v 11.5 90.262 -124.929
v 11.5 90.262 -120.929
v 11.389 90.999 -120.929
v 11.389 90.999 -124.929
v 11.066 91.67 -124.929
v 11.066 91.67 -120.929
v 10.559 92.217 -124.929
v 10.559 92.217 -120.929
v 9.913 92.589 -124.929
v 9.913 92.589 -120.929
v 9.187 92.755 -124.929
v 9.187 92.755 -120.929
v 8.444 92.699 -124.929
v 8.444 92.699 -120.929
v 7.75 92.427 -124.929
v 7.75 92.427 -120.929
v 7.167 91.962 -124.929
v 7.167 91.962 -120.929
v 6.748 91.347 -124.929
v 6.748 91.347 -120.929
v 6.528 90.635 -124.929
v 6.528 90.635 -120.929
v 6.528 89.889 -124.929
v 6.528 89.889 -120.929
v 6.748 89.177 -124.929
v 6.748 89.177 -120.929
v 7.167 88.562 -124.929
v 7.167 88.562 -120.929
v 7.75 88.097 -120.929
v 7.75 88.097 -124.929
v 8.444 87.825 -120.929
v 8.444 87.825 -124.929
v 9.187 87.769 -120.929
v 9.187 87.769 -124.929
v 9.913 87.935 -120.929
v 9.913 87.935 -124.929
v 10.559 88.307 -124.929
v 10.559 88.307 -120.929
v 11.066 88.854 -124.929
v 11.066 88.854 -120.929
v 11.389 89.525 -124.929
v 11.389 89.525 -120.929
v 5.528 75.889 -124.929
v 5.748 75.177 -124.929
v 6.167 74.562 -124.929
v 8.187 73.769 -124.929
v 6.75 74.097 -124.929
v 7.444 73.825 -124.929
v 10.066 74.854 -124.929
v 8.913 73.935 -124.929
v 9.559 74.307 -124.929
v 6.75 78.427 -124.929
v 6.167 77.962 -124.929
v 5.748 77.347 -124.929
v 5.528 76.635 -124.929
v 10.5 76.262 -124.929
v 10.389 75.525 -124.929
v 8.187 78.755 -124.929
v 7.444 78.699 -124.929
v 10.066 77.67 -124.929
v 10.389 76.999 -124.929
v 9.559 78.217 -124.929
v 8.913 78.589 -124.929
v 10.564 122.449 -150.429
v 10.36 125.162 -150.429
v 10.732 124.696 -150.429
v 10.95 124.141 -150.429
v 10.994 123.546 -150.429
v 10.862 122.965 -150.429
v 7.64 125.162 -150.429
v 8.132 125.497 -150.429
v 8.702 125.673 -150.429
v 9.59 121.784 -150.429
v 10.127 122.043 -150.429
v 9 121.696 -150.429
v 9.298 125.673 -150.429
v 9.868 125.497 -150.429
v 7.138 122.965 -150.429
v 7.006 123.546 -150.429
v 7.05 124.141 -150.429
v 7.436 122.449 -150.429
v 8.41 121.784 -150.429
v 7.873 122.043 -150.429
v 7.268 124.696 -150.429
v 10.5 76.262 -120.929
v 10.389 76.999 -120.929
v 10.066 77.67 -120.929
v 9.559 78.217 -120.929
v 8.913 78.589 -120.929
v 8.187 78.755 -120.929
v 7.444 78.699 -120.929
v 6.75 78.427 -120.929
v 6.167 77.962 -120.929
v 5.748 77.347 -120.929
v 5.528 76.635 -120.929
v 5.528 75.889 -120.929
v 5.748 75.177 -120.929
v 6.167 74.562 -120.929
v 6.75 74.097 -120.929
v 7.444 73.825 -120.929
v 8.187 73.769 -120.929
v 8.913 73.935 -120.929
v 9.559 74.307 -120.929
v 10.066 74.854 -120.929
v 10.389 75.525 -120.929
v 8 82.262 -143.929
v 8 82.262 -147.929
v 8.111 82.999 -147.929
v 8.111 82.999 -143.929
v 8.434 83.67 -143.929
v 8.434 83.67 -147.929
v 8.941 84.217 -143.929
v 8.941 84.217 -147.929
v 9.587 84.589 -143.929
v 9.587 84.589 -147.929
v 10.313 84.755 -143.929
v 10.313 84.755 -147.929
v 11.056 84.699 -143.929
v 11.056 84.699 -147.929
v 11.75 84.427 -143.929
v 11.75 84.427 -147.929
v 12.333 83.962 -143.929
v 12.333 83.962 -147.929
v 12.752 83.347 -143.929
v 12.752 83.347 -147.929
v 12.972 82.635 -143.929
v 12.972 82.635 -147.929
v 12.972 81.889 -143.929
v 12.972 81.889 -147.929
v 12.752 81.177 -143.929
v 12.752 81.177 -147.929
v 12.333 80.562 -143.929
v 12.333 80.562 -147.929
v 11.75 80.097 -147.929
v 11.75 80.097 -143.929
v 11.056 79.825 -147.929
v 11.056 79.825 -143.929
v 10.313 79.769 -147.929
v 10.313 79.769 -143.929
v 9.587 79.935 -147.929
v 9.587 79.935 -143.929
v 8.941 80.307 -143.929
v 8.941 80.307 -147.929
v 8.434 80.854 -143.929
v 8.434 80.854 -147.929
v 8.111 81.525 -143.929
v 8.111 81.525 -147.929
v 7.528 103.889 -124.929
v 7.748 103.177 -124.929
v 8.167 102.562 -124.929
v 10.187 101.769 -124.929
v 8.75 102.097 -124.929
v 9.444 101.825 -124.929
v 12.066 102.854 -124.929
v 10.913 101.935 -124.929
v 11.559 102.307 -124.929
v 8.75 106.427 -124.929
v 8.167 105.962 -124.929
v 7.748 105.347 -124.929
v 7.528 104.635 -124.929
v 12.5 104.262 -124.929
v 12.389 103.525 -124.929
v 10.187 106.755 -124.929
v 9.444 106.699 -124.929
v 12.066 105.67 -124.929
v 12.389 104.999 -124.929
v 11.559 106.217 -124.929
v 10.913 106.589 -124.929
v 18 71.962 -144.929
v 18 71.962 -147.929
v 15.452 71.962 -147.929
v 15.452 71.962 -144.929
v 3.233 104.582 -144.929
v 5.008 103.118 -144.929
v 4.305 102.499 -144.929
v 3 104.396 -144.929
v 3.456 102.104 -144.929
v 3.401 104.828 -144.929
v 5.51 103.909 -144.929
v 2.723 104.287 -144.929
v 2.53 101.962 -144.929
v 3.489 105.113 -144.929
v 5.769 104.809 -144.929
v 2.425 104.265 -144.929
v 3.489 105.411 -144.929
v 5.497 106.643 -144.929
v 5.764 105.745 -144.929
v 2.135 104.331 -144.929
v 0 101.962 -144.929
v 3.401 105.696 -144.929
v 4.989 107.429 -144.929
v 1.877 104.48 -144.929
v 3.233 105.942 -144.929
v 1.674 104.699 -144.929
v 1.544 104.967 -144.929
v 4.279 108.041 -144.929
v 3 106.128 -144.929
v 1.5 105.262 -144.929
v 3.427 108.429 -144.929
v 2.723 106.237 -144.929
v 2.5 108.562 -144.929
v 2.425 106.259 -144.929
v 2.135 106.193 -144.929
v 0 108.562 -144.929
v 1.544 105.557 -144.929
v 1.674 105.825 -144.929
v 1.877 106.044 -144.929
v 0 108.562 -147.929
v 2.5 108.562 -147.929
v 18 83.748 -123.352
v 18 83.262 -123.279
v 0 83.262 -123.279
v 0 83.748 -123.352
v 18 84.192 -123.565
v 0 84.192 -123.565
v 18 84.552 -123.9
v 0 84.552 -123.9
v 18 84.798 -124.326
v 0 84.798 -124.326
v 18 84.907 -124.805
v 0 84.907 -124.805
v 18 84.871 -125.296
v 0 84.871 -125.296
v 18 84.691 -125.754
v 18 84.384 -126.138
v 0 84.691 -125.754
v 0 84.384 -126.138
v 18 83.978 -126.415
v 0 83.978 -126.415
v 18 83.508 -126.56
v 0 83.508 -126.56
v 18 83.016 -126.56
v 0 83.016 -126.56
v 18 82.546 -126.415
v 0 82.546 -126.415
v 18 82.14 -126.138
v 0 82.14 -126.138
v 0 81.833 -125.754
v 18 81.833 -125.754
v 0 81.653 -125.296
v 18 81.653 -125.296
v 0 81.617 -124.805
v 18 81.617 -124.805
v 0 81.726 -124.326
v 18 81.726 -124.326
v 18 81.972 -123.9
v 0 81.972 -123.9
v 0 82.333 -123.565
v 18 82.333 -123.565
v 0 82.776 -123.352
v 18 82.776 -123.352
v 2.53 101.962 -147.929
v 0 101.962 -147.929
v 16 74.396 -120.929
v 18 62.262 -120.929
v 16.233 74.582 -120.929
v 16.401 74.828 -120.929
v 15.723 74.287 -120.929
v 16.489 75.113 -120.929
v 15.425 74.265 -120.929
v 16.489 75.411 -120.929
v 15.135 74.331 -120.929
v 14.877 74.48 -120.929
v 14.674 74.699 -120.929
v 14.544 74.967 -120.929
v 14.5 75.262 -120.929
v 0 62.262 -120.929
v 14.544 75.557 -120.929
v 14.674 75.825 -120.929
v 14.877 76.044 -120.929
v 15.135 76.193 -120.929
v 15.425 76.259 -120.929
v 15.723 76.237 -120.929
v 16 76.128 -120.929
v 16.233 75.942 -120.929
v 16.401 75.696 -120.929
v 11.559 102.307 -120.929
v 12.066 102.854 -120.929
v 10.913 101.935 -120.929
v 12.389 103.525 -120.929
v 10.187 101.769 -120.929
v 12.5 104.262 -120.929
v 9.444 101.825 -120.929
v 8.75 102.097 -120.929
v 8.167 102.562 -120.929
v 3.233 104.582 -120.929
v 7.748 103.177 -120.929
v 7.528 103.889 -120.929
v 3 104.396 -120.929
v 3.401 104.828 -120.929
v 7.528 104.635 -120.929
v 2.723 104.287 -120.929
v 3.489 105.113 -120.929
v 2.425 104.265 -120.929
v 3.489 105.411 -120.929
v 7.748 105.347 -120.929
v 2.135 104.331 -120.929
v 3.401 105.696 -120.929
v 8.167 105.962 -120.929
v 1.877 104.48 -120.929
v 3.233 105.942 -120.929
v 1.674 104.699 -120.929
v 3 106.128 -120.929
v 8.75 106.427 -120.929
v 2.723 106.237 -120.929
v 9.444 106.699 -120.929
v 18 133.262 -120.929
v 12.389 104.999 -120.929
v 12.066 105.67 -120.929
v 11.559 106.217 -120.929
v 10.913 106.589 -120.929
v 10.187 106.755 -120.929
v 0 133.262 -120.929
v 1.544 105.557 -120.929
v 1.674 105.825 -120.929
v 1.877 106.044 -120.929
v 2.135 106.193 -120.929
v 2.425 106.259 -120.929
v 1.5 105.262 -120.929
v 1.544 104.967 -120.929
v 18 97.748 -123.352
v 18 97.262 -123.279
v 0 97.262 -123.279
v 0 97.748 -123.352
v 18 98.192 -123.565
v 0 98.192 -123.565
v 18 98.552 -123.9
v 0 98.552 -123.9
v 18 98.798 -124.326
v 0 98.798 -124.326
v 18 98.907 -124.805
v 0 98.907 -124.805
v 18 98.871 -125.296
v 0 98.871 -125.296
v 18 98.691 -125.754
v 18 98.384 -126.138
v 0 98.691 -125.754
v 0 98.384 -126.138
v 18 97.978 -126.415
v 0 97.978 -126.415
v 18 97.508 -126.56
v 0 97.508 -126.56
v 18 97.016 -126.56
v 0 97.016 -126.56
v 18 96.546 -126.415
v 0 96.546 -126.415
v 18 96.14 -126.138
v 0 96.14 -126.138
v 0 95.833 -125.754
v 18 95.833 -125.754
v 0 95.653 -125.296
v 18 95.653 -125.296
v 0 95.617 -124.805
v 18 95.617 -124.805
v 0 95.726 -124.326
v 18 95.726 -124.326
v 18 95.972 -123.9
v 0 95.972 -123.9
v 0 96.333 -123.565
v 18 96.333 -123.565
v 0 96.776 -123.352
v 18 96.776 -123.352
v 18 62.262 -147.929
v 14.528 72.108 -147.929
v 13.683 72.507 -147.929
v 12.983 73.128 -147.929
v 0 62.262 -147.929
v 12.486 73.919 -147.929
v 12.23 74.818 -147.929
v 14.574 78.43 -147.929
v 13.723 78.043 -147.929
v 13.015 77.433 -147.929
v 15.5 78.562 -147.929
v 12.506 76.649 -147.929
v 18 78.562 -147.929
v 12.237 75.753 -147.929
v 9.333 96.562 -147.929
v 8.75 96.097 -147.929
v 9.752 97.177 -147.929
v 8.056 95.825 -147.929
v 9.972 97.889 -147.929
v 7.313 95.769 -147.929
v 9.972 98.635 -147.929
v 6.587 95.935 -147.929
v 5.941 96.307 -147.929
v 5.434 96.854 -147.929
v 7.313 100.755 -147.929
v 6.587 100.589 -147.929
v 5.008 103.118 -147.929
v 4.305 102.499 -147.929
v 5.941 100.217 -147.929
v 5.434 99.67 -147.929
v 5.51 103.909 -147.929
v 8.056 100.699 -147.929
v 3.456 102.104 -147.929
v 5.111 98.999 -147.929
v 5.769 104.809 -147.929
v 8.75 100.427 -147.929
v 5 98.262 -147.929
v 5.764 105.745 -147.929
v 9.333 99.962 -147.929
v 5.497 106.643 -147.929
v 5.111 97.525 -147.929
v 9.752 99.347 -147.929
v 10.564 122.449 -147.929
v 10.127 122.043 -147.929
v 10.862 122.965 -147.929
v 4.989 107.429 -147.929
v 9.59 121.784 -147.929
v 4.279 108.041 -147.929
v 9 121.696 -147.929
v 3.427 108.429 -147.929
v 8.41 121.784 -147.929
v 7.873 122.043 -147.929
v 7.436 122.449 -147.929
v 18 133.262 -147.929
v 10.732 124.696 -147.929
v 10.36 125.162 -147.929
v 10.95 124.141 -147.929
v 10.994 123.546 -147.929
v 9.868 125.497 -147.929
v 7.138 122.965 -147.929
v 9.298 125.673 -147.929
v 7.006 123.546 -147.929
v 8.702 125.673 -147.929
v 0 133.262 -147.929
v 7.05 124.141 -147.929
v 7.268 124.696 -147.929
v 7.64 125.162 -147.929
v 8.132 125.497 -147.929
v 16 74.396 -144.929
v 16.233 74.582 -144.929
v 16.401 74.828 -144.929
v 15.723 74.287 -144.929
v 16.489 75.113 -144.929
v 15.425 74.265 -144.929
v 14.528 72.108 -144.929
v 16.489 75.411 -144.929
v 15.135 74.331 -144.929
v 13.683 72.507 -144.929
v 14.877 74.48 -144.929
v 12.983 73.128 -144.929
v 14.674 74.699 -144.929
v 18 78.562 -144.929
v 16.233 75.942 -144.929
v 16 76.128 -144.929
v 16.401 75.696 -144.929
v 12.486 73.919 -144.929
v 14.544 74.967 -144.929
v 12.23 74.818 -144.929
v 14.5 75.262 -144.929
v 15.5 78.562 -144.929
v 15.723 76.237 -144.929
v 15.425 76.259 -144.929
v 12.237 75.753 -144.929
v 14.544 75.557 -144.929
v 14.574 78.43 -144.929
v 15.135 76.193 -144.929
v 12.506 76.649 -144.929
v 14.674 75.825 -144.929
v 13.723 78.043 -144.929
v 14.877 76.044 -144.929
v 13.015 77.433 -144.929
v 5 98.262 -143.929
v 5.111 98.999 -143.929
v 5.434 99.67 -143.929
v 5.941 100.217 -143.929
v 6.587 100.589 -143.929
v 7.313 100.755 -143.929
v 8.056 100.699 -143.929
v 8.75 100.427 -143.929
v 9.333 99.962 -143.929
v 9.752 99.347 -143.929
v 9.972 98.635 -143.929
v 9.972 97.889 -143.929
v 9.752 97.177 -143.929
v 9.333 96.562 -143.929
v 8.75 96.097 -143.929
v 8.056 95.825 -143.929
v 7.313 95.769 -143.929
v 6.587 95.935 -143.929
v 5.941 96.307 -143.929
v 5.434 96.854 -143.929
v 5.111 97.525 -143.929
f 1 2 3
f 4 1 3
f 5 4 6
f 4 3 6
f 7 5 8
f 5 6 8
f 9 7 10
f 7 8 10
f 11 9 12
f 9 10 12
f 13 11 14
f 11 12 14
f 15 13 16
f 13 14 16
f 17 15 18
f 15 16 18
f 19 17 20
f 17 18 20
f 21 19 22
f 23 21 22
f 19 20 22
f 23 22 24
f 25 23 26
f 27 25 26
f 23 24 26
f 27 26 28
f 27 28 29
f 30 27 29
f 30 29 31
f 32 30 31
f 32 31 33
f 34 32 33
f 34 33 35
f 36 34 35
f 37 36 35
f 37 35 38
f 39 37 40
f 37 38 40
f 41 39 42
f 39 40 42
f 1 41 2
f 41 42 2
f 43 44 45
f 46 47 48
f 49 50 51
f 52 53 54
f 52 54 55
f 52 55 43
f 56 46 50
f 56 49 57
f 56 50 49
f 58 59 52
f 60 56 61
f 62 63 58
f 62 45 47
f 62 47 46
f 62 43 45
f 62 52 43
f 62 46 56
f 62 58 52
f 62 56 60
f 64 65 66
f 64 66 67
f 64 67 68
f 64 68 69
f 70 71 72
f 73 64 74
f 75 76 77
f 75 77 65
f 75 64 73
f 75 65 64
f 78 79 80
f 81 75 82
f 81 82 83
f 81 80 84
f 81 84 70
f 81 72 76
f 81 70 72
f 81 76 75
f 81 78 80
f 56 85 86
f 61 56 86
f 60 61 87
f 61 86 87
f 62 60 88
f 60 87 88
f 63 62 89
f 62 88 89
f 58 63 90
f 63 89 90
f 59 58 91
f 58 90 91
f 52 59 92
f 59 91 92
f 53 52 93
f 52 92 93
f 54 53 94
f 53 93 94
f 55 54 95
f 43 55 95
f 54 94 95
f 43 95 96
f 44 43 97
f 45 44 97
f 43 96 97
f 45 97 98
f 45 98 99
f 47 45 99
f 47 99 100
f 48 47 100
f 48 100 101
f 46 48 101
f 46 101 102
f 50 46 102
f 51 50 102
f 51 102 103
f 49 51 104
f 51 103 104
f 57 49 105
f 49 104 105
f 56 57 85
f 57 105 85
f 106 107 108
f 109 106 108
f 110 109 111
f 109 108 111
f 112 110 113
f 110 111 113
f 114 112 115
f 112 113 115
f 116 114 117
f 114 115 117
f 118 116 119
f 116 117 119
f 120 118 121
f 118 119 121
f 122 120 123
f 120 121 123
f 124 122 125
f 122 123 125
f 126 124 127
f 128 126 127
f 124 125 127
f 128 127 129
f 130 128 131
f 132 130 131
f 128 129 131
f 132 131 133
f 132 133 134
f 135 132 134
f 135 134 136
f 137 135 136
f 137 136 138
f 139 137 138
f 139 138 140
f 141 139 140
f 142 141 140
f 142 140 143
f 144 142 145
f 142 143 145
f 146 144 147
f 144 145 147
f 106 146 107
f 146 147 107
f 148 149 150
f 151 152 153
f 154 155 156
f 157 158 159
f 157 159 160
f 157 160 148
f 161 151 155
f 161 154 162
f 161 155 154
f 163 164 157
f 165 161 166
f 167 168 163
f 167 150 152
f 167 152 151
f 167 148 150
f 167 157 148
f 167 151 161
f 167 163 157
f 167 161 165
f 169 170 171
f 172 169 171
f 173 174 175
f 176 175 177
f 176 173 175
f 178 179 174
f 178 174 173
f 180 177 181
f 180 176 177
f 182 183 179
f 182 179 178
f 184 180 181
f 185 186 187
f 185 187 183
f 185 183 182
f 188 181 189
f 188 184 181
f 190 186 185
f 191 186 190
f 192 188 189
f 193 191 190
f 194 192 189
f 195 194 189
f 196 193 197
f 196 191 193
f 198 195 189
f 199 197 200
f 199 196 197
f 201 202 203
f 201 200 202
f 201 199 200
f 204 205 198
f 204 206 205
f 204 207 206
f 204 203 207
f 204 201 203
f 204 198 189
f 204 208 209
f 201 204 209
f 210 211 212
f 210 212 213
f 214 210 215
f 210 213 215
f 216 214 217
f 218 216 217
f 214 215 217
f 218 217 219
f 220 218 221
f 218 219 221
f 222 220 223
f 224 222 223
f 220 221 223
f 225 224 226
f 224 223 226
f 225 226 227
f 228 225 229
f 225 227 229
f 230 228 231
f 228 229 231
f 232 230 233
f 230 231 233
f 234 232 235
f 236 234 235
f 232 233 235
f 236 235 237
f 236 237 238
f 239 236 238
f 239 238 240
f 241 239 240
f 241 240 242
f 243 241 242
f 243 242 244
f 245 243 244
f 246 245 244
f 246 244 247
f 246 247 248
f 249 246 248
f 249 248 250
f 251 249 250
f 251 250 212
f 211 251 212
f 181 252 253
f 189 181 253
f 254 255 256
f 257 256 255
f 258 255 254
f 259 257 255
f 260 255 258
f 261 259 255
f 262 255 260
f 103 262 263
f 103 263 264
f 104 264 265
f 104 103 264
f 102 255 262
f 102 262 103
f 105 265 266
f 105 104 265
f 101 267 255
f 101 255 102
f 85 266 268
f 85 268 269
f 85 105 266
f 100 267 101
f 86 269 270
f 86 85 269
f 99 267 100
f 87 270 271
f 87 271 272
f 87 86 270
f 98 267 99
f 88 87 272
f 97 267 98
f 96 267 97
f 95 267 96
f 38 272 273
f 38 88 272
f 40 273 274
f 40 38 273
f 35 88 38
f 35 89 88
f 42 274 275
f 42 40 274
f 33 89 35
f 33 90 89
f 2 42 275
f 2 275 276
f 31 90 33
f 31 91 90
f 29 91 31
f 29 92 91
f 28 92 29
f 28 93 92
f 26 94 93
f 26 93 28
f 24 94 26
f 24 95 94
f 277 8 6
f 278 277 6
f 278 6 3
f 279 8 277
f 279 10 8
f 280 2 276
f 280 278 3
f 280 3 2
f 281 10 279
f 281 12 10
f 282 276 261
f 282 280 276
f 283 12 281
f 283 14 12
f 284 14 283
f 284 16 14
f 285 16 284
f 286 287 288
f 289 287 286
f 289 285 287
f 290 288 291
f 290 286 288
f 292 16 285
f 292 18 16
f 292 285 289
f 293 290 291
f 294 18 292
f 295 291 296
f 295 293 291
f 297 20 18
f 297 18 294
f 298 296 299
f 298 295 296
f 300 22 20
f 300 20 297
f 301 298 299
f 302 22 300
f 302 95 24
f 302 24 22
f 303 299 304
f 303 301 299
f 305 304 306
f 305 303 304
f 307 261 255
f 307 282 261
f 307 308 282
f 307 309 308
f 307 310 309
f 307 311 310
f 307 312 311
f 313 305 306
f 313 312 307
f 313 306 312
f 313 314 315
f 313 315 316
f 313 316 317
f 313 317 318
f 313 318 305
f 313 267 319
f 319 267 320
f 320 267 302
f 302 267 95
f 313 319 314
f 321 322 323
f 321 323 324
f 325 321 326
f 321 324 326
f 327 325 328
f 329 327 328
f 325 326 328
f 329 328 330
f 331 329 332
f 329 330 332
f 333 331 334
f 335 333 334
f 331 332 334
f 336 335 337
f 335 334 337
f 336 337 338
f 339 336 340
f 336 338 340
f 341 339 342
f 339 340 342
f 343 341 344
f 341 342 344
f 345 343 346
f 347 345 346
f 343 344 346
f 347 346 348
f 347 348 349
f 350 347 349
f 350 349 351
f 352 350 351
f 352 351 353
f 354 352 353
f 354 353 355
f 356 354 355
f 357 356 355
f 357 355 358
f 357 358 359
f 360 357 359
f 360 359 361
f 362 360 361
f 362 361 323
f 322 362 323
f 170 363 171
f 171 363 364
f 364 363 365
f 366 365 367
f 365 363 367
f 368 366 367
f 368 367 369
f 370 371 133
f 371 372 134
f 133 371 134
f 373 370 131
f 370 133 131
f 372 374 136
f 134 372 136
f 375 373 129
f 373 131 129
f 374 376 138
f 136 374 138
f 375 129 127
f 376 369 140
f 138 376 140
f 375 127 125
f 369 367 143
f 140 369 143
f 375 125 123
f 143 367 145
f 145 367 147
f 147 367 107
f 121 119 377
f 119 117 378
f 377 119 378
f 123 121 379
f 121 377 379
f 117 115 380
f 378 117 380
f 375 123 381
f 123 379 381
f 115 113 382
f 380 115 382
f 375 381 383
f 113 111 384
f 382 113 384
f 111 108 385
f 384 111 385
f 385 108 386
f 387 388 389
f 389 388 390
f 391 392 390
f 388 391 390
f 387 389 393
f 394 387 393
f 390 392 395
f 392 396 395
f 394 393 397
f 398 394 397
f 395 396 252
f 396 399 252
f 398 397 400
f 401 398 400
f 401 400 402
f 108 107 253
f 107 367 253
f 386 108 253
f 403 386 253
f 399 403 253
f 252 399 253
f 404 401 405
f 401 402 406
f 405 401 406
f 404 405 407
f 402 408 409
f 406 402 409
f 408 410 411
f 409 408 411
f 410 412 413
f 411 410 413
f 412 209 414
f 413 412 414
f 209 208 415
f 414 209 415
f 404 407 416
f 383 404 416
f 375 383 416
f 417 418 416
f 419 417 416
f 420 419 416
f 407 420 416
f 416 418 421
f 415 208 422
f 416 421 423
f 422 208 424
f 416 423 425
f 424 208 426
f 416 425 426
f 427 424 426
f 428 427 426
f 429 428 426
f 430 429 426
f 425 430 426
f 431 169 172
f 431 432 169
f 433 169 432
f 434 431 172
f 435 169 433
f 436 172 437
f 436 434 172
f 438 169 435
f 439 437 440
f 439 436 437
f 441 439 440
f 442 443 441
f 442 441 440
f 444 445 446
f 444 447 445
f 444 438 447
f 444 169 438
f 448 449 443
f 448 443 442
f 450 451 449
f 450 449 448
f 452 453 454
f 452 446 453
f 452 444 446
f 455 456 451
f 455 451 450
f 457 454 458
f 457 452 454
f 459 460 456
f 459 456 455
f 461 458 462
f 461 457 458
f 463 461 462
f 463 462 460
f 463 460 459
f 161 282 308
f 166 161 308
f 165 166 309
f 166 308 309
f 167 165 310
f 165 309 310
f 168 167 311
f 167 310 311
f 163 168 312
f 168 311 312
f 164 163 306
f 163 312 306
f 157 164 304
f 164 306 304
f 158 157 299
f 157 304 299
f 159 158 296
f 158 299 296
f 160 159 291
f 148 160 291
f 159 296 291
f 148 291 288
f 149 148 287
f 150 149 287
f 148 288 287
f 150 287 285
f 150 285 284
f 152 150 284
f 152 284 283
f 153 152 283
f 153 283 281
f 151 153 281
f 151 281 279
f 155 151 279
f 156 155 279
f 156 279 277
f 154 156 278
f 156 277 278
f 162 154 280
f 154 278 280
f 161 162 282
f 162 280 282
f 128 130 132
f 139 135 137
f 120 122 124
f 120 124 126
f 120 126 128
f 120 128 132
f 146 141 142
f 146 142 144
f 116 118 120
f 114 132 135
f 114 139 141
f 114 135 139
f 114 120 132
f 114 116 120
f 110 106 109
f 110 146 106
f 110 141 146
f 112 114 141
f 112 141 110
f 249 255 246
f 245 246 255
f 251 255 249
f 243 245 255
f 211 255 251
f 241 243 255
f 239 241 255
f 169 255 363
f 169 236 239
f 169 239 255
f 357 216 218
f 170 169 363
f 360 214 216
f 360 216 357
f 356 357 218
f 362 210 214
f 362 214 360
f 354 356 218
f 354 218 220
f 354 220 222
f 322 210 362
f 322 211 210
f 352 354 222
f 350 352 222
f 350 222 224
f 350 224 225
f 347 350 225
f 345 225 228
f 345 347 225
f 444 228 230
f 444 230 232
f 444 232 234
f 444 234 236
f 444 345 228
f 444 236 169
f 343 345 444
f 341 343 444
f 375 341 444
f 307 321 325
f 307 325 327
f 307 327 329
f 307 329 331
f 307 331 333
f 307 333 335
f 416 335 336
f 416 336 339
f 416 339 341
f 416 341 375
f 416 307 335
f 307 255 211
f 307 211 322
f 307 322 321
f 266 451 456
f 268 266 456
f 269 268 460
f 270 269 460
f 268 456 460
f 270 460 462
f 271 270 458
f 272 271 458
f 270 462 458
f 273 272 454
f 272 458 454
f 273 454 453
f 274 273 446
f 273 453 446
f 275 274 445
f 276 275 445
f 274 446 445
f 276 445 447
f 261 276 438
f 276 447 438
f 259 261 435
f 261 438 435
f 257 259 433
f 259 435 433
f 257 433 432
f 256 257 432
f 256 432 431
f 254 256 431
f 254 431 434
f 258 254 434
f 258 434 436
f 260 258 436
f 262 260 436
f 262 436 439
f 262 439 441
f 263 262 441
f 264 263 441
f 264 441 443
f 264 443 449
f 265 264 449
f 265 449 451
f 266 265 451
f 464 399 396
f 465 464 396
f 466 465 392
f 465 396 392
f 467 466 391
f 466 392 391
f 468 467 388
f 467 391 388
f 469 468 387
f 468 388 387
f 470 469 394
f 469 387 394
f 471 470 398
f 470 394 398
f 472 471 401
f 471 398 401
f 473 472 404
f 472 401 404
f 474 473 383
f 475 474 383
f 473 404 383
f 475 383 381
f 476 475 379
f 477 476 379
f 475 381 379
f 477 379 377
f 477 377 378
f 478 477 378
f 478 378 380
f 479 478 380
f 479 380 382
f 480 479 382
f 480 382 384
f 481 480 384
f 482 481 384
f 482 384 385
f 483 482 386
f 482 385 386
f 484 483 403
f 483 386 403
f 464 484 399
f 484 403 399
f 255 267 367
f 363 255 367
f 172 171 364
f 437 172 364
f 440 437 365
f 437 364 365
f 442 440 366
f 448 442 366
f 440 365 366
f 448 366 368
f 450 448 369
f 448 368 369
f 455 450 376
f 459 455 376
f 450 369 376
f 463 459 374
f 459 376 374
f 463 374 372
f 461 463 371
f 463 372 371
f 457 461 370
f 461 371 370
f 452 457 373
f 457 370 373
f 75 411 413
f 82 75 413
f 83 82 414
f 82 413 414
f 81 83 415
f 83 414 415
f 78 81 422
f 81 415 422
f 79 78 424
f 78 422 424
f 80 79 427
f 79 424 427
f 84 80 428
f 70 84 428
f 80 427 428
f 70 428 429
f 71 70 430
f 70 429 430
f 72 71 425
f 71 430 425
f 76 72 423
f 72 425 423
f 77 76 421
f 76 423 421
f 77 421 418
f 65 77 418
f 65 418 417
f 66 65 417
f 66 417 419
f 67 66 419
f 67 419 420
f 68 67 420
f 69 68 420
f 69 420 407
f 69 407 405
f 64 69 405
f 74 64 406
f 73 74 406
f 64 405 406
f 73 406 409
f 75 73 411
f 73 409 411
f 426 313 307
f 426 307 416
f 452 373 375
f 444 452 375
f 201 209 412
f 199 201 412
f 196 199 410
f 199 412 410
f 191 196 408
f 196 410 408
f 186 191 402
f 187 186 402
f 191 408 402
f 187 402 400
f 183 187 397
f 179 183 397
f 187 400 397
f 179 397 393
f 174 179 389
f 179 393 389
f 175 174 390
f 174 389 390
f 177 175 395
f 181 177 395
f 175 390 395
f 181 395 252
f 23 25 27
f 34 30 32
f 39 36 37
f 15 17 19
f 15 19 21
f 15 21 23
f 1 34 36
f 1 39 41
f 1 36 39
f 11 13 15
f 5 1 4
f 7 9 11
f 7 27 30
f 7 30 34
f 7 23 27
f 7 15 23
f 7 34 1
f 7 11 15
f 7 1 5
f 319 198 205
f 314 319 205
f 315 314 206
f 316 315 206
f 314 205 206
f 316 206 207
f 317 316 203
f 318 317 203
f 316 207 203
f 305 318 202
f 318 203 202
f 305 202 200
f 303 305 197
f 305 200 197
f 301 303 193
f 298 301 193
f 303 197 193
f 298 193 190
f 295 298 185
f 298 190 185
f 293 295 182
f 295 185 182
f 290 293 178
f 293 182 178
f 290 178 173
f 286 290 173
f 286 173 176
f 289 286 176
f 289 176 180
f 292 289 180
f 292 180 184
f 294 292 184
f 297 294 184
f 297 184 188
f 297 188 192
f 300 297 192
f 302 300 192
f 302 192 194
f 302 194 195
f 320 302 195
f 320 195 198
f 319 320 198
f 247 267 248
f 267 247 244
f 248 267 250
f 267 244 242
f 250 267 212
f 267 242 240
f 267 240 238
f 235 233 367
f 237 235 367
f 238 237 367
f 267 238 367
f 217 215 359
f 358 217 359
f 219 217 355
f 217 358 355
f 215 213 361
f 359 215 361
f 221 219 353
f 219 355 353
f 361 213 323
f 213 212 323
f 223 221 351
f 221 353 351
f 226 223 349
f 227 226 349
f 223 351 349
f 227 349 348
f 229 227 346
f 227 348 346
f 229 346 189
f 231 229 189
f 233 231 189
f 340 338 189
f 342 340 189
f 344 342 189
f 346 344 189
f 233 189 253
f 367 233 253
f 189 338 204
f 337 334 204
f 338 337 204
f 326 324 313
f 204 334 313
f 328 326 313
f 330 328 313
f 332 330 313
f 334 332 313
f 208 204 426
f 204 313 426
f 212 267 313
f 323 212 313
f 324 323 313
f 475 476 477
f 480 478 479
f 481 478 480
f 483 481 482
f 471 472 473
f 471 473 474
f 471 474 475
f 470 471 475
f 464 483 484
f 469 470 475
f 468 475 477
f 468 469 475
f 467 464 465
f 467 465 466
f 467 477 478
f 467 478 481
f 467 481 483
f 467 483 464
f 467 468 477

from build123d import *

# Parameters (mm, degrees)
ESQUISSE1_W             = 27
ESQUISSE1_H             = 71
BOSS_EXTRU_1_DEPTH      = 18
ESQUISSE2_R             = 1.65
ENL_V_MAT_EXTRU_1_DEPTH = 200.914193796
ESQUISSE5_R             = 2
BOSS_EXTRU_2_DEPTH      = 2.5
ESQUISSE6_R             = 2.5
ENL_V_MAT_EXTRU_2_DEPTH = 4
ENL_V_MAT_EXTRU_3_DEPTH = 3
ESQUISSE7_3_R           = 1
ENL_V_MAT_EXTRU_4_DEPTH = 138.156023146
ESQUISSE8_R             = 2.5
ENL_V_MAT_EXTRU_5_DEPTH = 4


with BuildPart() as part:
    # Esquisse1 → Boss.-Extru.1 (new body)
    with BuildSketch(Plane(origin=(0, 0, 0), x_dir=(0, 0, -1), z_dir=(1, 0, 0))):
        with Locations((134.428733504, 97.762052682)):
            Rectangle(ESQUISSE1_W, ESQUISSE1_H)
    extrude(amount=BOSS_EXTRU_1_DEPTH)

    # Esquisse2 → Enlèv. mat.-Extru.1 (cut, through all)
    with BuildSketch(Plane.ZY):
        with Locations((-124.928733504, 97.262052682)):
            Circle(ESQUISSE2_R)
        with Locations((-124.928733504, 83.262052682)):
            Circle(ESQUISSE2_R)
    extrude(amount=-ENL_V_MAT_EXTRU_1_DEPTH, mode=Mode.SUBTRACT)

    # Esquisse5 → Boss.-Extru.2 (add)
    with BuildSketch(Plane(origin=(0, 0, -147.928733504), x_dir=(-1, 0, 0), z_dir=(0, 0, -1))):
        with Locations((-9, 123.695505567)):
            Circle(ESQUISSE5_R)
    extrude(amount=BOSS_EXTRU_2_DEPTH)

    # Esquisse6 → Enlèv. mat.-Extru.2 (cut)
    with BuildSketch(Plane(origin=(0, 0, -147.928733504), x_dir=(-1, 0, 0), z_dir=(0, 0, -1))):
        with Locations((-10.5, 82.262052682)):
            Circle(ESQUISSE6_R)
        with Locations((-7.5, 98.262052682)):
            Circle(ESQUISSE6_R)
    extrude(amount=-ENL_V_MAT_EXTRU_2_DEPTH, mode=Mode.SUBTRACT)

    # Esquisse7 → Enlèv. mat.-Extru.3 (cut)
    with BuildSketch(Plane(origin=(0, 0, -147.928733504), x_dir=(-1, 0, 0), z_dir=(0, 0, -1))):
        with BuildLine():
            Line((0, 108.562052682), (-2.5, 108.562052682))
            ThreePointArc((-2.5, 108.562052682), (-5.79996536, 105.277172969), (-2.530240256, 101.962191242))
            Line((-2.530240256, 101.962191242), (0, 101.962191242))
            Line((0, 101.962191242), (0, 108.562052682))
        make_face()
        with BuildLine():
            ThreePointArc((-15.451765432, 71.962405212), (-12.200088134, 75.286170611), (-15.5, 78.562052682))
            Line((-15.5, 78.562052682), (-18, 78.562052682))
            Line((-18, 78.562052682), (-18, 71.962405212))
            Line((-18, 71.962405212), (-15.451765432, 71.962405212))
        make_face()
    extrude(amount=-ENL_V_MAT_EXTRU_3_DEPTH, mode=Mode.SUBTRACT)

    # Esquisse7<3> → Enlèv. mat.-Extru.4 (cut, through all)
    with BuildSketch(Plane(origin=(0, 0, -147.928733504), x_dir=(-1, 0, 0), z_dir=(0, 0, -1))):
        with Locations((-2.5, 105.262052682)):
            Circle(ESQUISSE7_3_R)
        with Locations((-15.5, 75.262052682)):
            Circle(ESQUISSE7_3_R)
    extrude(amount=-ENL_V_MAT_EXTRU_4_DEPTH, mode=Mode.SUBTRACT)

    # Esquisse8 → Enlèv. mat.-Extru.5 (cut)
    with BuildSketch(Plane.XY.offset(-120.928733504)):
        with Locations((8, 76.262052682)):
            Circle(ESQUISSE8_R)
        with Locations((9, 90.262052682)):
            Circle(ESQUISSE8_R)
        with Locations((10, 104.262052682)):
            Circle(ESQUISSE8_R)
    extrude(amount=-ENL_V_MAT_EXTRU_5_DEPTH, mode=Mode.SUBTRACT)


solid = part.part
